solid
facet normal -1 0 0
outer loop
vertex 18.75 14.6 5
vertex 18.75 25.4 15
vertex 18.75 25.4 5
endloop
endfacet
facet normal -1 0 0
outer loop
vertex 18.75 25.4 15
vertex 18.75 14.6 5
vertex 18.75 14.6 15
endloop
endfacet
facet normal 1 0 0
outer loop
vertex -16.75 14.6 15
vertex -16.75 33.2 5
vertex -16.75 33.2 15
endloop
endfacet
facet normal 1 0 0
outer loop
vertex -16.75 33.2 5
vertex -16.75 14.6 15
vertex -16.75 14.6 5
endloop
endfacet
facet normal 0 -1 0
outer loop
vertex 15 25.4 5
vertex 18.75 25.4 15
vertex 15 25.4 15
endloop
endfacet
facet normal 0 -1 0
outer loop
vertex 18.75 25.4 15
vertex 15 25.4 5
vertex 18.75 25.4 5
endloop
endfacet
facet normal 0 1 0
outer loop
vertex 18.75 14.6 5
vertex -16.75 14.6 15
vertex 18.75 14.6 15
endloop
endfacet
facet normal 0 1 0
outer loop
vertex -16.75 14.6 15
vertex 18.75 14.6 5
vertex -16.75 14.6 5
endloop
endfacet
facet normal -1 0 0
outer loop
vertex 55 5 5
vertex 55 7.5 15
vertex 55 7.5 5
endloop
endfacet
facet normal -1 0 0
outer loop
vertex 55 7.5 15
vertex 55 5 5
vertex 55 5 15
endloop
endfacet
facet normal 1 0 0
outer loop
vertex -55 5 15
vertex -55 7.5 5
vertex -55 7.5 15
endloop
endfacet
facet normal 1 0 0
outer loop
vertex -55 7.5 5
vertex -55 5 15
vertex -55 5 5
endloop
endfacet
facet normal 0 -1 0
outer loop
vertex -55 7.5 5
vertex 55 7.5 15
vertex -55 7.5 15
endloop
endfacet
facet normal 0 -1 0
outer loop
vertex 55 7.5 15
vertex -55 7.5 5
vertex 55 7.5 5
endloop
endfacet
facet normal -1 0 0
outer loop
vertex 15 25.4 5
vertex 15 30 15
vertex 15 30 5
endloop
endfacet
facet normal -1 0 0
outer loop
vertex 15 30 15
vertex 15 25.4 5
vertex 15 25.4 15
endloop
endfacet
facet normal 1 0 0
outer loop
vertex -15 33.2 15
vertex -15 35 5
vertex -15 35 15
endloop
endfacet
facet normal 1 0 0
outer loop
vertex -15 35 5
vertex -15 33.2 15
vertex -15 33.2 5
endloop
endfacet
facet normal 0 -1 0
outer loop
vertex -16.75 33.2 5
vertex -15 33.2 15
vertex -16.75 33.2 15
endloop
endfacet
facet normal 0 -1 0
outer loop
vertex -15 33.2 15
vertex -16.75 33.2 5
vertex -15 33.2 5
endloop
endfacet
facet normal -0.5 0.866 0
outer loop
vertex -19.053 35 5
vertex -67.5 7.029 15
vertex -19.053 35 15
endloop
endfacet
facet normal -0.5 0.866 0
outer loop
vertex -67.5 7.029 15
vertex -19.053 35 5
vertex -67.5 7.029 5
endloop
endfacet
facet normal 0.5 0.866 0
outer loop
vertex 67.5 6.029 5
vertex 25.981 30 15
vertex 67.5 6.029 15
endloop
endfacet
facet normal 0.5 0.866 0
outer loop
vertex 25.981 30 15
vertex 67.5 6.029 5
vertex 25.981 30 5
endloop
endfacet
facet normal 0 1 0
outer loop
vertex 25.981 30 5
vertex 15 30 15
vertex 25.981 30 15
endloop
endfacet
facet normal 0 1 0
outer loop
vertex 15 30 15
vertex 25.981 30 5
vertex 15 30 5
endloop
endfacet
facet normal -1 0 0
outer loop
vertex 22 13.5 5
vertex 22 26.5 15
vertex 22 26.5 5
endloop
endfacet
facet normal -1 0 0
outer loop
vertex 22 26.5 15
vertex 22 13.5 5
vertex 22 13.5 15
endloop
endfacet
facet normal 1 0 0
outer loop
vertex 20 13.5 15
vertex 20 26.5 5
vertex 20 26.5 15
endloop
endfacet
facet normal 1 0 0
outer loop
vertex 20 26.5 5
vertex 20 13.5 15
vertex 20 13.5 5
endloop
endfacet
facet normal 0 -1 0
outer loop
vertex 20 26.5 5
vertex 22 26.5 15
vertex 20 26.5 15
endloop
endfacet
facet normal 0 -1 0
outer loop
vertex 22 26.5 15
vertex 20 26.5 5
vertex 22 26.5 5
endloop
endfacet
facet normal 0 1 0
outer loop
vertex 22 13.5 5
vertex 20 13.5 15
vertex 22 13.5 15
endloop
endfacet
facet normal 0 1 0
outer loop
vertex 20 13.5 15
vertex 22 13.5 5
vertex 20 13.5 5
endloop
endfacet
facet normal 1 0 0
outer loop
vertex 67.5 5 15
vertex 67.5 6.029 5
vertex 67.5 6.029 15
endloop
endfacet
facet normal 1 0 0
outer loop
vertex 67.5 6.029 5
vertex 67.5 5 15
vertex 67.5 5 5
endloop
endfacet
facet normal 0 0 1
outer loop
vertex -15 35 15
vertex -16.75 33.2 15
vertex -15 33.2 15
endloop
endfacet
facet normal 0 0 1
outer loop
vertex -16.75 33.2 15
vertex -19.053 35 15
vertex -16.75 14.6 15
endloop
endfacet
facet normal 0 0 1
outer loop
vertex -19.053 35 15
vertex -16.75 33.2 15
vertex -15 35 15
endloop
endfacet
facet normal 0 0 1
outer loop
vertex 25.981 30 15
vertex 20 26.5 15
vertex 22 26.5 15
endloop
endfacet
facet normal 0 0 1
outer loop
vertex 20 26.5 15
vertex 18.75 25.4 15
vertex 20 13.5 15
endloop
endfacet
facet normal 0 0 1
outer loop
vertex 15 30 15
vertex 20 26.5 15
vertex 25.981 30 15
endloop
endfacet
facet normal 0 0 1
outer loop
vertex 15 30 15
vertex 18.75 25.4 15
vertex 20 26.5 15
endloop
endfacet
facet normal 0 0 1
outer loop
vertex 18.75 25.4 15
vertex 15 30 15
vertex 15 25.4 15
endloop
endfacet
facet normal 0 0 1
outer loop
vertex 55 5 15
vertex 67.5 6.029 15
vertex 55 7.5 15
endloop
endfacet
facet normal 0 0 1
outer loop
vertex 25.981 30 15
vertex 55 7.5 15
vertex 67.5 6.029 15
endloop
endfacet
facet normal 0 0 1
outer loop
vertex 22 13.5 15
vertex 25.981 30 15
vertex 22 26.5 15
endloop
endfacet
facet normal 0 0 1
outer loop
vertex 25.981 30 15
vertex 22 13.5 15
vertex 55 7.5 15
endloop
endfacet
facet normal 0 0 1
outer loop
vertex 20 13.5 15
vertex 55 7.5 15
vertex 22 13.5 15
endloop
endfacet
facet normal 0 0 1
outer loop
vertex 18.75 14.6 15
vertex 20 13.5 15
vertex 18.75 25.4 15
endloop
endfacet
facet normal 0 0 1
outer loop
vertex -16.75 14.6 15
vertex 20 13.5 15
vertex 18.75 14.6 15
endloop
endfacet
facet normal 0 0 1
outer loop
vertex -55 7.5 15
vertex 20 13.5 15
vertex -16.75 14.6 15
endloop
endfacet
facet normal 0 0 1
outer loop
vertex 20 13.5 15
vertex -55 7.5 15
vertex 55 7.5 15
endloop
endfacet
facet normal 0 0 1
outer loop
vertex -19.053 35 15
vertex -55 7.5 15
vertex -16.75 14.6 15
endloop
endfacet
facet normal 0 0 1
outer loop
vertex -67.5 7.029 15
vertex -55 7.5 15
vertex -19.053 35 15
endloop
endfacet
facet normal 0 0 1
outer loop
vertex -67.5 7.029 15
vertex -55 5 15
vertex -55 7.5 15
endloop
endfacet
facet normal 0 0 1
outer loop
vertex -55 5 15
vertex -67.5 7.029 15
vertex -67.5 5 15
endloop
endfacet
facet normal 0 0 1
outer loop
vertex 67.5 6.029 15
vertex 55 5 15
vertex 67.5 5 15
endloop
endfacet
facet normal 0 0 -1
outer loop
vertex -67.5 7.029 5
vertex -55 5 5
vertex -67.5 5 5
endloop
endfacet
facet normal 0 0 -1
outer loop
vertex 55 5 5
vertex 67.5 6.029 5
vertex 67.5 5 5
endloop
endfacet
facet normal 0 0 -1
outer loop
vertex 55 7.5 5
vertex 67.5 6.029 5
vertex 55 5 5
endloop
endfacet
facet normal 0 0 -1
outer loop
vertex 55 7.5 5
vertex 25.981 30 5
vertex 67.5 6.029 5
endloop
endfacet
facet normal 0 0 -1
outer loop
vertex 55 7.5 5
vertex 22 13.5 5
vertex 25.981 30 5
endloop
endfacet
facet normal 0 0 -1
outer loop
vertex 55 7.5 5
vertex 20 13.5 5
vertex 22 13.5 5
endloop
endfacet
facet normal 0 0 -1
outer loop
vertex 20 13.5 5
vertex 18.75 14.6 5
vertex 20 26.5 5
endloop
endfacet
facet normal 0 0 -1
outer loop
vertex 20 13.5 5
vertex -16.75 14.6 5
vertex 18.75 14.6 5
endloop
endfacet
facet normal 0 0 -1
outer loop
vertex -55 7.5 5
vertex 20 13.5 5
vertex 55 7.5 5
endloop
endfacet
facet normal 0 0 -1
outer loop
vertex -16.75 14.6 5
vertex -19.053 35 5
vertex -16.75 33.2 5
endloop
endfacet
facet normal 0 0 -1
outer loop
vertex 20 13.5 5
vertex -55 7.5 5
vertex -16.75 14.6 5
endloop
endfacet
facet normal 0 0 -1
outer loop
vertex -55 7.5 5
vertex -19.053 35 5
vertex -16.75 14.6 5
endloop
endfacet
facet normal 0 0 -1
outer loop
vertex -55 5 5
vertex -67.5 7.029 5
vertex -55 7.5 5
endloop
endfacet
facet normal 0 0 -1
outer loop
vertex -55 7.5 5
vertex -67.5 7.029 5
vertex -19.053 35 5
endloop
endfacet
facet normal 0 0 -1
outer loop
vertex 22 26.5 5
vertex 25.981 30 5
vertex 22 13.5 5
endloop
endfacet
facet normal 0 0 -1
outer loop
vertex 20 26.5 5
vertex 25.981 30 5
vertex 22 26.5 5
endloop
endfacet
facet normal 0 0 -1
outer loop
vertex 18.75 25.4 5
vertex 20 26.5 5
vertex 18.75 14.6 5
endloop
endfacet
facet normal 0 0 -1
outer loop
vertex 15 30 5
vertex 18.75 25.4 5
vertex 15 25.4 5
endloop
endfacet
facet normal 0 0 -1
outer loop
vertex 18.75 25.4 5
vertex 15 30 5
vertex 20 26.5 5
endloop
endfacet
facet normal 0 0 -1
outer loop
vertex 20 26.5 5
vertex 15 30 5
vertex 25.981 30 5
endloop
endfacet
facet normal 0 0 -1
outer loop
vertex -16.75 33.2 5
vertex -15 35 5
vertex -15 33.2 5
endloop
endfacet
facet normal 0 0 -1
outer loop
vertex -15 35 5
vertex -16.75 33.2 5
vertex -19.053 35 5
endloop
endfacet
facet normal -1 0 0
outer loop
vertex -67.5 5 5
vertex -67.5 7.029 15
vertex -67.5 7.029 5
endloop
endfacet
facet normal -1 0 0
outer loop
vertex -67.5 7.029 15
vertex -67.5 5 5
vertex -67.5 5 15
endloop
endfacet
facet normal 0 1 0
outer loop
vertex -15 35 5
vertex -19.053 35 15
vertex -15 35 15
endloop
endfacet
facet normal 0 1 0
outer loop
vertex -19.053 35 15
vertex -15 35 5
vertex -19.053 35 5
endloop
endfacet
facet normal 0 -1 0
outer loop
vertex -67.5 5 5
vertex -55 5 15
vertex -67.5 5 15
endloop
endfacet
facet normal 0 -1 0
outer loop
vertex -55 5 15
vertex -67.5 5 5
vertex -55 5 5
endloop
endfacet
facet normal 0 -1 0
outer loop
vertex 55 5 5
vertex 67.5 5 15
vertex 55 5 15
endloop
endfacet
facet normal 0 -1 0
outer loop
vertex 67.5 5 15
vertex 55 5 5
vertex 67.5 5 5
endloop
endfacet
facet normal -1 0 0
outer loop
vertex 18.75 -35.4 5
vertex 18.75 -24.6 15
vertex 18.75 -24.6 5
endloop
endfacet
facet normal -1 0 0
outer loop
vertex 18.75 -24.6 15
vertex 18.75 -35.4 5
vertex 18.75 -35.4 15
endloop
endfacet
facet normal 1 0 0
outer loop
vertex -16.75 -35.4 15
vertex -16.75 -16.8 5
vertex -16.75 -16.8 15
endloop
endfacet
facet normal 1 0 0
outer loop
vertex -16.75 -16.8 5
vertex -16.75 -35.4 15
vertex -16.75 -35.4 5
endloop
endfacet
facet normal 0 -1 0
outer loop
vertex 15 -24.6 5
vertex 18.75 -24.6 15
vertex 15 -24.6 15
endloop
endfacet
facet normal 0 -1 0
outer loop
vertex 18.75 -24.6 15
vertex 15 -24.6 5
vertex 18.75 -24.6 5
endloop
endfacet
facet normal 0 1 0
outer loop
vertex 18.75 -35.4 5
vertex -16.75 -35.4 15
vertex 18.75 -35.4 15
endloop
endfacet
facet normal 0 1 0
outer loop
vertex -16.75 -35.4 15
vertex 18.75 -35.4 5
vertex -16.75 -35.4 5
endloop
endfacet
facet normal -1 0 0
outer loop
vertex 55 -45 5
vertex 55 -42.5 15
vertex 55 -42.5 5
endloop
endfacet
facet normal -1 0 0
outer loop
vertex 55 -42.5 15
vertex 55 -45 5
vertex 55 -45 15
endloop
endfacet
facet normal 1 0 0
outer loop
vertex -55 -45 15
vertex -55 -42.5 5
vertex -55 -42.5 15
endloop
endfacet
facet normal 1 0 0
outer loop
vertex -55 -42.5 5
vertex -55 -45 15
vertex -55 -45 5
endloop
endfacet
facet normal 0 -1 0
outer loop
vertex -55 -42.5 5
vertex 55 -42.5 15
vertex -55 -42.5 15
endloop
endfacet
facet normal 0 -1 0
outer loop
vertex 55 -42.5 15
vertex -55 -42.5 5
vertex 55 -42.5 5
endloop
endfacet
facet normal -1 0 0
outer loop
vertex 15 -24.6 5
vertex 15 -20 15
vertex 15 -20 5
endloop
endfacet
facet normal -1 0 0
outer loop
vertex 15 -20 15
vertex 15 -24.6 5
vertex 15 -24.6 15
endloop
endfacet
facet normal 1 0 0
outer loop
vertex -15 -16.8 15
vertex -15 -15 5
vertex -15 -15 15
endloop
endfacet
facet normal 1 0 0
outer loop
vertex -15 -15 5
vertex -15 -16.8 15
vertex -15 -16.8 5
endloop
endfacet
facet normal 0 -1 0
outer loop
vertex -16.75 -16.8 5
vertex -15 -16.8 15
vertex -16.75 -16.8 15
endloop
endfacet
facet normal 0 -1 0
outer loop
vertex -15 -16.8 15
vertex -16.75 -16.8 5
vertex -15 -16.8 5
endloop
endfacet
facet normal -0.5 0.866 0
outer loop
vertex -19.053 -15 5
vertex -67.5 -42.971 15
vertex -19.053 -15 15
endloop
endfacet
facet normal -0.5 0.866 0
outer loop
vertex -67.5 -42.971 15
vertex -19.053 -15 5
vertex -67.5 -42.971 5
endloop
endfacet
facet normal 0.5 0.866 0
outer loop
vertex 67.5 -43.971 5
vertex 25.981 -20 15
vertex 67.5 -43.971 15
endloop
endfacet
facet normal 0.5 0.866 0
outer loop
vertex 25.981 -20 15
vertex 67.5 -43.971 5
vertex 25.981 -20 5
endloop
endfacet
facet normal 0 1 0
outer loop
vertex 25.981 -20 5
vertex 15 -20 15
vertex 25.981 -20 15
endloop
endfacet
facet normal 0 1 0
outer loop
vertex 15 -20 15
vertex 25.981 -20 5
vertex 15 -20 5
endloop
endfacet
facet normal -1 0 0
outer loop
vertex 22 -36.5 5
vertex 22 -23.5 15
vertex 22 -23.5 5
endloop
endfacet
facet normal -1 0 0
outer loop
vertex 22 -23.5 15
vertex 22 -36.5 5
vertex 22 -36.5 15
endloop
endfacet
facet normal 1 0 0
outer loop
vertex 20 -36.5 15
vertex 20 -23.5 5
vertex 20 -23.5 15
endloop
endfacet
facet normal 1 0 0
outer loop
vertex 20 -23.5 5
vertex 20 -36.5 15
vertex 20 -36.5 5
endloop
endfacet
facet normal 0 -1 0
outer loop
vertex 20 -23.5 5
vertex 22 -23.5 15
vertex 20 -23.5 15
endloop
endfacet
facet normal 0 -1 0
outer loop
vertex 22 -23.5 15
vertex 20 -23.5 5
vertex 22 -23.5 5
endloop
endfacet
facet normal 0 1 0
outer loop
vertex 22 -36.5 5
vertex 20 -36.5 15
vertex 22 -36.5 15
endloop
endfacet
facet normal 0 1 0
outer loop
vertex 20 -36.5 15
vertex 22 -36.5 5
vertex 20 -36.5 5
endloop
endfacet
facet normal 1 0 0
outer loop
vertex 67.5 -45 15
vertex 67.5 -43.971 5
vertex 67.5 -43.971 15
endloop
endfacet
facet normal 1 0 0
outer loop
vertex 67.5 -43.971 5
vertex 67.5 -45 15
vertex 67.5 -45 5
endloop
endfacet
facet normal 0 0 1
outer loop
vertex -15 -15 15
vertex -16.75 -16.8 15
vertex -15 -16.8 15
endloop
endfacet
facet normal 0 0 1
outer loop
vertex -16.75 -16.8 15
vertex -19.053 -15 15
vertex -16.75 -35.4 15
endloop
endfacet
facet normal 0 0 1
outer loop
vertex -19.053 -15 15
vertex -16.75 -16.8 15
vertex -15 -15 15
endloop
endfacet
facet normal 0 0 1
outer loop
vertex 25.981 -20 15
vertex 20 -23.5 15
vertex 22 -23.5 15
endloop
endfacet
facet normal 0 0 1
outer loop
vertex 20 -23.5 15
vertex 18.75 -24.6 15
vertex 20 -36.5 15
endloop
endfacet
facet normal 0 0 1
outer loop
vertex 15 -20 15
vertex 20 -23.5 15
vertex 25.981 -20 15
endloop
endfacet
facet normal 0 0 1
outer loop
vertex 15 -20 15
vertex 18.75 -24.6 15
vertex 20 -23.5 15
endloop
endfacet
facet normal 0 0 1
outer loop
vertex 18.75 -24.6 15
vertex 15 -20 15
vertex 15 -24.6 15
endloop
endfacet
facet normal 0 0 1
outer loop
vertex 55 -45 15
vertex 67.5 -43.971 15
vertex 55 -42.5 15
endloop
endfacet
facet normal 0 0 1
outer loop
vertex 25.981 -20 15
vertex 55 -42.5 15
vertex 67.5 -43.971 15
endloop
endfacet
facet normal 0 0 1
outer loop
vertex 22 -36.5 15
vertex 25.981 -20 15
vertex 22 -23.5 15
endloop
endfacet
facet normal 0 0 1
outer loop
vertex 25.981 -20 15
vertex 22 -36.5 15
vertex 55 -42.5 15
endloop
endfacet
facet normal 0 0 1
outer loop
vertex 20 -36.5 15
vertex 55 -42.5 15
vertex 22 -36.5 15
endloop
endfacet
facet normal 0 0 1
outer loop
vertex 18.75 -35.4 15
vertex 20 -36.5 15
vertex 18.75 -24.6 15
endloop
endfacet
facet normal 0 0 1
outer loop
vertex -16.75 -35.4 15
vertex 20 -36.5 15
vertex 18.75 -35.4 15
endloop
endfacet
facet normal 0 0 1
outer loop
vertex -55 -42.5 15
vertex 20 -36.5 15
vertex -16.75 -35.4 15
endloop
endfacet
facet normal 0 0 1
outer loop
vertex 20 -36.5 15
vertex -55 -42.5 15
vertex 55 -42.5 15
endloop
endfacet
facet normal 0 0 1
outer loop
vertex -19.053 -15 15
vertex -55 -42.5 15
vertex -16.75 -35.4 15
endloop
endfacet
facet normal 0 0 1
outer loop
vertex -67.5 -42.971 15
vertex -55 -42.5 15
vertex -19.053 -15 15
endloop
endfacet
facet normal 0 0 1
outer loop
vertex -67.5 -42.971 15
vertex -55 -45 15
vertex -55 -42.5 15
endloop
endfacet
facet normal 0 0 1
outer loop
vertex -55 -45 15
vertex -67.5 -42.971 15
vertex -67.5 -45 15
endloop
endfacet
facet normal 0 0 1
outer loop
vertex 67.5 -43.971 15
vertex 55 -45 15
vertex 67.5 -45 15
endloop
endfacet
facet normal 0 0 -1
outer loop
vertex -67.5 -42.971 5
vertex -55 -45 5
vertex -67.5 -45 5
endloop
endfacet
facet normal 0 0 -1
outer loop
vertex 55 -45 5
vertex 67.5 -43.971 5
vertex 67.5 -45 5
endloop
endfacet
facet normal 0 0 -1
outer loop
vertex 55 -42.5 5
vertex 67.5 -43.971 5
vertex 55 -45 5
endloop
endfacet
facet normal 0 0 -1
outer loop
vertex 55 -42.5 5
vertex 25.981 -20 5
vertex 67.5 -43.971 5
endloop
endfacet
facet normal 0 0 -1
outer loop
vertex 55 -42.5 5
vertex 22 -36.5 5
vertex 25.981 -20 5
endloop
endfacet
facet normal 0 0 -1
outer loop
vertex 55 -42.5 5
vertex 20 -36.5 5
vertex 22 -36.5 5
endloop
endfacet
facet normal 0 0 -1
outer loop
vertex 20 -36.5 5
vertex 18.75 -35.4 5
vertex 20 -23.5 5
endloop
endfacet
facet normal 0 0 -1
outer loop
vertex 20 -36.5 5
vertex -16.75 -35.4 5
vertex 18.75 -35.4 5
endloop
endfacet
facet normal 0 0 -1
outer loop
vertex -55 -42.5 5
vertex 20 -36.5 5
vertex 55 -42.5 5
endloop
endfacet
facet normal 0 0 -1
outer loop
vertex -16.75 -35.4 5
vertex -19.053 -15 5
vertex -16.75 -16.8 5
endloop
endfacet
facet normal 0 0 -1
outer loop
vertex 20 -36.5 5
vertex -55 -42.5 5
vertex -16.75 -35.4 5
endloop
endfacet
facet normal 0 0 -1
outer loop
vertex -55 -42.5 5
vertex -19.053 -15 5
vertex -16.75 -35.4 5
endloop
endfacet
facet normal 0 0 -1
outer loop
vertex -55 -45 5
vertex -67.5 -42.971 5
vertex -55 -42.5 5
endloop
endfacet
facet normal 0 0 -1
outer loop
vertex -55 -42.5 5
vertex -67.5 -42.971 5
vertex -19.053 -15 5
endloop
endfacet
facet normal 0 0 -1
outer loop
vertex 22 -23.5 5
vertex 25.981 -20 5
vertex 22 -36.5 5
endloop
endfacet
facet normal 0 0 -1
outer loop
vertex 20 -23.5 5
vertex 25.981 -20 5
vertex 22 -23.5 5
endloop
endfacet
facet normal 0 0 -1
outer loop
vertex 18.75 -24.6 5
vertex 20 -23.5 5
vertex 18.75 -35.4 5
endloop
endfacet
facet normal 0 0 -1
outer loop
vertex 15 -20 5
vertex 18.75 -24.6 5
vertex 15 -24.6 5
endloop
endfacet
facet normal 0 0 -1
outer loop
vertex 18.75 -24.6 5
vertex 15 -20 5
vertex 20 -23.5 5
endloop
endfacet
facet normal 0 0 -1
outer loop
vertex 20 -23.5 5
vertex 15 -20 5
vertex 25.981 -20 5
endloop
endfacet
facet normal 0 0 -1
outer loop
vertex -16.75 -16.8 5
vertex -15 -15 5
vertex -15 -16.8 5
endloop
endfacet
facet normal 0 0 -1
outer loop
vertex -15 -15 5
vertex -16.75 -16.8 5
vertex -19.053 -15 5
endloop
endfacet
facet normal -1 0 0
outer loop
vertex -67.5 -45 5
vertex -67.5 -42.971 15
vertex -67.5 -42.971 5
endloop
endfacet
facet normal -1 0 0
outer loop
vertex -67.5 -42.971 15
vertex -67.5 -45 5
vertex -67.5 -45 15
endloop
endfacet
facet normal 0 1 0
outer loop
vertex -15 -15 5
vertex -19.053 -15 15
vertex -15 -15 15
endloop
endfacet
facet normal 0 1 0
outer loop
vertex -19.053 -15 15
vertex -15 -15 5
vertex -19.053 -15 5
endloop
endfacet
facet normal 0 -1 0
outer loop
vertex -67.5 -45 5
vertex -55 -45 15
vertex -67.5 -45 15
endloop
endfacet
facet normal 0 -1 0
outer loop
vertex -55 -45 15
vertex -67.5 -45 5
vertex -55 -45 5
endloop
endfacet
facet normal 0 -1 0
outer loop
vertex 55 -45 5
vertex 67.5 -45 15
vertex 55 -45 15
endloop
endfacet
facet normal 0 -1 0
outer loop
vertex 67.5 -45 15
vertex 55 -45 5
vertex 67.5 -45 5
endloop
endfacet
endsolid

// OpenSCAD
module ikea_foot() {

    difference() {
	
	union() {	    
	    translate([0, -5, 20/2])		
		cube([135, 30, 10], center = true);	    
	}
	
	union() {
	    
	    translate([1, -5, 20/2])		
		cube([35.5, 10.8, 28], center = true);

	    translate([0, -25, 20/2])		
		cube([110, 15, 28], center = true);

	    translate([0, 20, 20/2])		
		cube([30, 40, 28], center = true);

	    translate([-35.5/4+1, -10.8/2+8.2, 20/2])		
		cube([35.5/2, 10.8, 28], center = true);

	    translate([-50, 21, 20/2])
		rotate(a=[0,0,30])
		   cube([100, 50, 28], center = true);

	    translate([50, 20, 20/2])
		rotate(a=[0,0,-30])
		   cube([100, 50, 28], center = true);

	    translate([50, 30, 20/2])
		cube([100, 50, 28], center = true);

	    translate([21, -5, 20/2])		
		cube([2, 13, 28], center = true);
	}	
    }
}

translate([0, 25, 0])		
    ikea_foot();

translate([0, -25, 0])		
    ikea_foot();
